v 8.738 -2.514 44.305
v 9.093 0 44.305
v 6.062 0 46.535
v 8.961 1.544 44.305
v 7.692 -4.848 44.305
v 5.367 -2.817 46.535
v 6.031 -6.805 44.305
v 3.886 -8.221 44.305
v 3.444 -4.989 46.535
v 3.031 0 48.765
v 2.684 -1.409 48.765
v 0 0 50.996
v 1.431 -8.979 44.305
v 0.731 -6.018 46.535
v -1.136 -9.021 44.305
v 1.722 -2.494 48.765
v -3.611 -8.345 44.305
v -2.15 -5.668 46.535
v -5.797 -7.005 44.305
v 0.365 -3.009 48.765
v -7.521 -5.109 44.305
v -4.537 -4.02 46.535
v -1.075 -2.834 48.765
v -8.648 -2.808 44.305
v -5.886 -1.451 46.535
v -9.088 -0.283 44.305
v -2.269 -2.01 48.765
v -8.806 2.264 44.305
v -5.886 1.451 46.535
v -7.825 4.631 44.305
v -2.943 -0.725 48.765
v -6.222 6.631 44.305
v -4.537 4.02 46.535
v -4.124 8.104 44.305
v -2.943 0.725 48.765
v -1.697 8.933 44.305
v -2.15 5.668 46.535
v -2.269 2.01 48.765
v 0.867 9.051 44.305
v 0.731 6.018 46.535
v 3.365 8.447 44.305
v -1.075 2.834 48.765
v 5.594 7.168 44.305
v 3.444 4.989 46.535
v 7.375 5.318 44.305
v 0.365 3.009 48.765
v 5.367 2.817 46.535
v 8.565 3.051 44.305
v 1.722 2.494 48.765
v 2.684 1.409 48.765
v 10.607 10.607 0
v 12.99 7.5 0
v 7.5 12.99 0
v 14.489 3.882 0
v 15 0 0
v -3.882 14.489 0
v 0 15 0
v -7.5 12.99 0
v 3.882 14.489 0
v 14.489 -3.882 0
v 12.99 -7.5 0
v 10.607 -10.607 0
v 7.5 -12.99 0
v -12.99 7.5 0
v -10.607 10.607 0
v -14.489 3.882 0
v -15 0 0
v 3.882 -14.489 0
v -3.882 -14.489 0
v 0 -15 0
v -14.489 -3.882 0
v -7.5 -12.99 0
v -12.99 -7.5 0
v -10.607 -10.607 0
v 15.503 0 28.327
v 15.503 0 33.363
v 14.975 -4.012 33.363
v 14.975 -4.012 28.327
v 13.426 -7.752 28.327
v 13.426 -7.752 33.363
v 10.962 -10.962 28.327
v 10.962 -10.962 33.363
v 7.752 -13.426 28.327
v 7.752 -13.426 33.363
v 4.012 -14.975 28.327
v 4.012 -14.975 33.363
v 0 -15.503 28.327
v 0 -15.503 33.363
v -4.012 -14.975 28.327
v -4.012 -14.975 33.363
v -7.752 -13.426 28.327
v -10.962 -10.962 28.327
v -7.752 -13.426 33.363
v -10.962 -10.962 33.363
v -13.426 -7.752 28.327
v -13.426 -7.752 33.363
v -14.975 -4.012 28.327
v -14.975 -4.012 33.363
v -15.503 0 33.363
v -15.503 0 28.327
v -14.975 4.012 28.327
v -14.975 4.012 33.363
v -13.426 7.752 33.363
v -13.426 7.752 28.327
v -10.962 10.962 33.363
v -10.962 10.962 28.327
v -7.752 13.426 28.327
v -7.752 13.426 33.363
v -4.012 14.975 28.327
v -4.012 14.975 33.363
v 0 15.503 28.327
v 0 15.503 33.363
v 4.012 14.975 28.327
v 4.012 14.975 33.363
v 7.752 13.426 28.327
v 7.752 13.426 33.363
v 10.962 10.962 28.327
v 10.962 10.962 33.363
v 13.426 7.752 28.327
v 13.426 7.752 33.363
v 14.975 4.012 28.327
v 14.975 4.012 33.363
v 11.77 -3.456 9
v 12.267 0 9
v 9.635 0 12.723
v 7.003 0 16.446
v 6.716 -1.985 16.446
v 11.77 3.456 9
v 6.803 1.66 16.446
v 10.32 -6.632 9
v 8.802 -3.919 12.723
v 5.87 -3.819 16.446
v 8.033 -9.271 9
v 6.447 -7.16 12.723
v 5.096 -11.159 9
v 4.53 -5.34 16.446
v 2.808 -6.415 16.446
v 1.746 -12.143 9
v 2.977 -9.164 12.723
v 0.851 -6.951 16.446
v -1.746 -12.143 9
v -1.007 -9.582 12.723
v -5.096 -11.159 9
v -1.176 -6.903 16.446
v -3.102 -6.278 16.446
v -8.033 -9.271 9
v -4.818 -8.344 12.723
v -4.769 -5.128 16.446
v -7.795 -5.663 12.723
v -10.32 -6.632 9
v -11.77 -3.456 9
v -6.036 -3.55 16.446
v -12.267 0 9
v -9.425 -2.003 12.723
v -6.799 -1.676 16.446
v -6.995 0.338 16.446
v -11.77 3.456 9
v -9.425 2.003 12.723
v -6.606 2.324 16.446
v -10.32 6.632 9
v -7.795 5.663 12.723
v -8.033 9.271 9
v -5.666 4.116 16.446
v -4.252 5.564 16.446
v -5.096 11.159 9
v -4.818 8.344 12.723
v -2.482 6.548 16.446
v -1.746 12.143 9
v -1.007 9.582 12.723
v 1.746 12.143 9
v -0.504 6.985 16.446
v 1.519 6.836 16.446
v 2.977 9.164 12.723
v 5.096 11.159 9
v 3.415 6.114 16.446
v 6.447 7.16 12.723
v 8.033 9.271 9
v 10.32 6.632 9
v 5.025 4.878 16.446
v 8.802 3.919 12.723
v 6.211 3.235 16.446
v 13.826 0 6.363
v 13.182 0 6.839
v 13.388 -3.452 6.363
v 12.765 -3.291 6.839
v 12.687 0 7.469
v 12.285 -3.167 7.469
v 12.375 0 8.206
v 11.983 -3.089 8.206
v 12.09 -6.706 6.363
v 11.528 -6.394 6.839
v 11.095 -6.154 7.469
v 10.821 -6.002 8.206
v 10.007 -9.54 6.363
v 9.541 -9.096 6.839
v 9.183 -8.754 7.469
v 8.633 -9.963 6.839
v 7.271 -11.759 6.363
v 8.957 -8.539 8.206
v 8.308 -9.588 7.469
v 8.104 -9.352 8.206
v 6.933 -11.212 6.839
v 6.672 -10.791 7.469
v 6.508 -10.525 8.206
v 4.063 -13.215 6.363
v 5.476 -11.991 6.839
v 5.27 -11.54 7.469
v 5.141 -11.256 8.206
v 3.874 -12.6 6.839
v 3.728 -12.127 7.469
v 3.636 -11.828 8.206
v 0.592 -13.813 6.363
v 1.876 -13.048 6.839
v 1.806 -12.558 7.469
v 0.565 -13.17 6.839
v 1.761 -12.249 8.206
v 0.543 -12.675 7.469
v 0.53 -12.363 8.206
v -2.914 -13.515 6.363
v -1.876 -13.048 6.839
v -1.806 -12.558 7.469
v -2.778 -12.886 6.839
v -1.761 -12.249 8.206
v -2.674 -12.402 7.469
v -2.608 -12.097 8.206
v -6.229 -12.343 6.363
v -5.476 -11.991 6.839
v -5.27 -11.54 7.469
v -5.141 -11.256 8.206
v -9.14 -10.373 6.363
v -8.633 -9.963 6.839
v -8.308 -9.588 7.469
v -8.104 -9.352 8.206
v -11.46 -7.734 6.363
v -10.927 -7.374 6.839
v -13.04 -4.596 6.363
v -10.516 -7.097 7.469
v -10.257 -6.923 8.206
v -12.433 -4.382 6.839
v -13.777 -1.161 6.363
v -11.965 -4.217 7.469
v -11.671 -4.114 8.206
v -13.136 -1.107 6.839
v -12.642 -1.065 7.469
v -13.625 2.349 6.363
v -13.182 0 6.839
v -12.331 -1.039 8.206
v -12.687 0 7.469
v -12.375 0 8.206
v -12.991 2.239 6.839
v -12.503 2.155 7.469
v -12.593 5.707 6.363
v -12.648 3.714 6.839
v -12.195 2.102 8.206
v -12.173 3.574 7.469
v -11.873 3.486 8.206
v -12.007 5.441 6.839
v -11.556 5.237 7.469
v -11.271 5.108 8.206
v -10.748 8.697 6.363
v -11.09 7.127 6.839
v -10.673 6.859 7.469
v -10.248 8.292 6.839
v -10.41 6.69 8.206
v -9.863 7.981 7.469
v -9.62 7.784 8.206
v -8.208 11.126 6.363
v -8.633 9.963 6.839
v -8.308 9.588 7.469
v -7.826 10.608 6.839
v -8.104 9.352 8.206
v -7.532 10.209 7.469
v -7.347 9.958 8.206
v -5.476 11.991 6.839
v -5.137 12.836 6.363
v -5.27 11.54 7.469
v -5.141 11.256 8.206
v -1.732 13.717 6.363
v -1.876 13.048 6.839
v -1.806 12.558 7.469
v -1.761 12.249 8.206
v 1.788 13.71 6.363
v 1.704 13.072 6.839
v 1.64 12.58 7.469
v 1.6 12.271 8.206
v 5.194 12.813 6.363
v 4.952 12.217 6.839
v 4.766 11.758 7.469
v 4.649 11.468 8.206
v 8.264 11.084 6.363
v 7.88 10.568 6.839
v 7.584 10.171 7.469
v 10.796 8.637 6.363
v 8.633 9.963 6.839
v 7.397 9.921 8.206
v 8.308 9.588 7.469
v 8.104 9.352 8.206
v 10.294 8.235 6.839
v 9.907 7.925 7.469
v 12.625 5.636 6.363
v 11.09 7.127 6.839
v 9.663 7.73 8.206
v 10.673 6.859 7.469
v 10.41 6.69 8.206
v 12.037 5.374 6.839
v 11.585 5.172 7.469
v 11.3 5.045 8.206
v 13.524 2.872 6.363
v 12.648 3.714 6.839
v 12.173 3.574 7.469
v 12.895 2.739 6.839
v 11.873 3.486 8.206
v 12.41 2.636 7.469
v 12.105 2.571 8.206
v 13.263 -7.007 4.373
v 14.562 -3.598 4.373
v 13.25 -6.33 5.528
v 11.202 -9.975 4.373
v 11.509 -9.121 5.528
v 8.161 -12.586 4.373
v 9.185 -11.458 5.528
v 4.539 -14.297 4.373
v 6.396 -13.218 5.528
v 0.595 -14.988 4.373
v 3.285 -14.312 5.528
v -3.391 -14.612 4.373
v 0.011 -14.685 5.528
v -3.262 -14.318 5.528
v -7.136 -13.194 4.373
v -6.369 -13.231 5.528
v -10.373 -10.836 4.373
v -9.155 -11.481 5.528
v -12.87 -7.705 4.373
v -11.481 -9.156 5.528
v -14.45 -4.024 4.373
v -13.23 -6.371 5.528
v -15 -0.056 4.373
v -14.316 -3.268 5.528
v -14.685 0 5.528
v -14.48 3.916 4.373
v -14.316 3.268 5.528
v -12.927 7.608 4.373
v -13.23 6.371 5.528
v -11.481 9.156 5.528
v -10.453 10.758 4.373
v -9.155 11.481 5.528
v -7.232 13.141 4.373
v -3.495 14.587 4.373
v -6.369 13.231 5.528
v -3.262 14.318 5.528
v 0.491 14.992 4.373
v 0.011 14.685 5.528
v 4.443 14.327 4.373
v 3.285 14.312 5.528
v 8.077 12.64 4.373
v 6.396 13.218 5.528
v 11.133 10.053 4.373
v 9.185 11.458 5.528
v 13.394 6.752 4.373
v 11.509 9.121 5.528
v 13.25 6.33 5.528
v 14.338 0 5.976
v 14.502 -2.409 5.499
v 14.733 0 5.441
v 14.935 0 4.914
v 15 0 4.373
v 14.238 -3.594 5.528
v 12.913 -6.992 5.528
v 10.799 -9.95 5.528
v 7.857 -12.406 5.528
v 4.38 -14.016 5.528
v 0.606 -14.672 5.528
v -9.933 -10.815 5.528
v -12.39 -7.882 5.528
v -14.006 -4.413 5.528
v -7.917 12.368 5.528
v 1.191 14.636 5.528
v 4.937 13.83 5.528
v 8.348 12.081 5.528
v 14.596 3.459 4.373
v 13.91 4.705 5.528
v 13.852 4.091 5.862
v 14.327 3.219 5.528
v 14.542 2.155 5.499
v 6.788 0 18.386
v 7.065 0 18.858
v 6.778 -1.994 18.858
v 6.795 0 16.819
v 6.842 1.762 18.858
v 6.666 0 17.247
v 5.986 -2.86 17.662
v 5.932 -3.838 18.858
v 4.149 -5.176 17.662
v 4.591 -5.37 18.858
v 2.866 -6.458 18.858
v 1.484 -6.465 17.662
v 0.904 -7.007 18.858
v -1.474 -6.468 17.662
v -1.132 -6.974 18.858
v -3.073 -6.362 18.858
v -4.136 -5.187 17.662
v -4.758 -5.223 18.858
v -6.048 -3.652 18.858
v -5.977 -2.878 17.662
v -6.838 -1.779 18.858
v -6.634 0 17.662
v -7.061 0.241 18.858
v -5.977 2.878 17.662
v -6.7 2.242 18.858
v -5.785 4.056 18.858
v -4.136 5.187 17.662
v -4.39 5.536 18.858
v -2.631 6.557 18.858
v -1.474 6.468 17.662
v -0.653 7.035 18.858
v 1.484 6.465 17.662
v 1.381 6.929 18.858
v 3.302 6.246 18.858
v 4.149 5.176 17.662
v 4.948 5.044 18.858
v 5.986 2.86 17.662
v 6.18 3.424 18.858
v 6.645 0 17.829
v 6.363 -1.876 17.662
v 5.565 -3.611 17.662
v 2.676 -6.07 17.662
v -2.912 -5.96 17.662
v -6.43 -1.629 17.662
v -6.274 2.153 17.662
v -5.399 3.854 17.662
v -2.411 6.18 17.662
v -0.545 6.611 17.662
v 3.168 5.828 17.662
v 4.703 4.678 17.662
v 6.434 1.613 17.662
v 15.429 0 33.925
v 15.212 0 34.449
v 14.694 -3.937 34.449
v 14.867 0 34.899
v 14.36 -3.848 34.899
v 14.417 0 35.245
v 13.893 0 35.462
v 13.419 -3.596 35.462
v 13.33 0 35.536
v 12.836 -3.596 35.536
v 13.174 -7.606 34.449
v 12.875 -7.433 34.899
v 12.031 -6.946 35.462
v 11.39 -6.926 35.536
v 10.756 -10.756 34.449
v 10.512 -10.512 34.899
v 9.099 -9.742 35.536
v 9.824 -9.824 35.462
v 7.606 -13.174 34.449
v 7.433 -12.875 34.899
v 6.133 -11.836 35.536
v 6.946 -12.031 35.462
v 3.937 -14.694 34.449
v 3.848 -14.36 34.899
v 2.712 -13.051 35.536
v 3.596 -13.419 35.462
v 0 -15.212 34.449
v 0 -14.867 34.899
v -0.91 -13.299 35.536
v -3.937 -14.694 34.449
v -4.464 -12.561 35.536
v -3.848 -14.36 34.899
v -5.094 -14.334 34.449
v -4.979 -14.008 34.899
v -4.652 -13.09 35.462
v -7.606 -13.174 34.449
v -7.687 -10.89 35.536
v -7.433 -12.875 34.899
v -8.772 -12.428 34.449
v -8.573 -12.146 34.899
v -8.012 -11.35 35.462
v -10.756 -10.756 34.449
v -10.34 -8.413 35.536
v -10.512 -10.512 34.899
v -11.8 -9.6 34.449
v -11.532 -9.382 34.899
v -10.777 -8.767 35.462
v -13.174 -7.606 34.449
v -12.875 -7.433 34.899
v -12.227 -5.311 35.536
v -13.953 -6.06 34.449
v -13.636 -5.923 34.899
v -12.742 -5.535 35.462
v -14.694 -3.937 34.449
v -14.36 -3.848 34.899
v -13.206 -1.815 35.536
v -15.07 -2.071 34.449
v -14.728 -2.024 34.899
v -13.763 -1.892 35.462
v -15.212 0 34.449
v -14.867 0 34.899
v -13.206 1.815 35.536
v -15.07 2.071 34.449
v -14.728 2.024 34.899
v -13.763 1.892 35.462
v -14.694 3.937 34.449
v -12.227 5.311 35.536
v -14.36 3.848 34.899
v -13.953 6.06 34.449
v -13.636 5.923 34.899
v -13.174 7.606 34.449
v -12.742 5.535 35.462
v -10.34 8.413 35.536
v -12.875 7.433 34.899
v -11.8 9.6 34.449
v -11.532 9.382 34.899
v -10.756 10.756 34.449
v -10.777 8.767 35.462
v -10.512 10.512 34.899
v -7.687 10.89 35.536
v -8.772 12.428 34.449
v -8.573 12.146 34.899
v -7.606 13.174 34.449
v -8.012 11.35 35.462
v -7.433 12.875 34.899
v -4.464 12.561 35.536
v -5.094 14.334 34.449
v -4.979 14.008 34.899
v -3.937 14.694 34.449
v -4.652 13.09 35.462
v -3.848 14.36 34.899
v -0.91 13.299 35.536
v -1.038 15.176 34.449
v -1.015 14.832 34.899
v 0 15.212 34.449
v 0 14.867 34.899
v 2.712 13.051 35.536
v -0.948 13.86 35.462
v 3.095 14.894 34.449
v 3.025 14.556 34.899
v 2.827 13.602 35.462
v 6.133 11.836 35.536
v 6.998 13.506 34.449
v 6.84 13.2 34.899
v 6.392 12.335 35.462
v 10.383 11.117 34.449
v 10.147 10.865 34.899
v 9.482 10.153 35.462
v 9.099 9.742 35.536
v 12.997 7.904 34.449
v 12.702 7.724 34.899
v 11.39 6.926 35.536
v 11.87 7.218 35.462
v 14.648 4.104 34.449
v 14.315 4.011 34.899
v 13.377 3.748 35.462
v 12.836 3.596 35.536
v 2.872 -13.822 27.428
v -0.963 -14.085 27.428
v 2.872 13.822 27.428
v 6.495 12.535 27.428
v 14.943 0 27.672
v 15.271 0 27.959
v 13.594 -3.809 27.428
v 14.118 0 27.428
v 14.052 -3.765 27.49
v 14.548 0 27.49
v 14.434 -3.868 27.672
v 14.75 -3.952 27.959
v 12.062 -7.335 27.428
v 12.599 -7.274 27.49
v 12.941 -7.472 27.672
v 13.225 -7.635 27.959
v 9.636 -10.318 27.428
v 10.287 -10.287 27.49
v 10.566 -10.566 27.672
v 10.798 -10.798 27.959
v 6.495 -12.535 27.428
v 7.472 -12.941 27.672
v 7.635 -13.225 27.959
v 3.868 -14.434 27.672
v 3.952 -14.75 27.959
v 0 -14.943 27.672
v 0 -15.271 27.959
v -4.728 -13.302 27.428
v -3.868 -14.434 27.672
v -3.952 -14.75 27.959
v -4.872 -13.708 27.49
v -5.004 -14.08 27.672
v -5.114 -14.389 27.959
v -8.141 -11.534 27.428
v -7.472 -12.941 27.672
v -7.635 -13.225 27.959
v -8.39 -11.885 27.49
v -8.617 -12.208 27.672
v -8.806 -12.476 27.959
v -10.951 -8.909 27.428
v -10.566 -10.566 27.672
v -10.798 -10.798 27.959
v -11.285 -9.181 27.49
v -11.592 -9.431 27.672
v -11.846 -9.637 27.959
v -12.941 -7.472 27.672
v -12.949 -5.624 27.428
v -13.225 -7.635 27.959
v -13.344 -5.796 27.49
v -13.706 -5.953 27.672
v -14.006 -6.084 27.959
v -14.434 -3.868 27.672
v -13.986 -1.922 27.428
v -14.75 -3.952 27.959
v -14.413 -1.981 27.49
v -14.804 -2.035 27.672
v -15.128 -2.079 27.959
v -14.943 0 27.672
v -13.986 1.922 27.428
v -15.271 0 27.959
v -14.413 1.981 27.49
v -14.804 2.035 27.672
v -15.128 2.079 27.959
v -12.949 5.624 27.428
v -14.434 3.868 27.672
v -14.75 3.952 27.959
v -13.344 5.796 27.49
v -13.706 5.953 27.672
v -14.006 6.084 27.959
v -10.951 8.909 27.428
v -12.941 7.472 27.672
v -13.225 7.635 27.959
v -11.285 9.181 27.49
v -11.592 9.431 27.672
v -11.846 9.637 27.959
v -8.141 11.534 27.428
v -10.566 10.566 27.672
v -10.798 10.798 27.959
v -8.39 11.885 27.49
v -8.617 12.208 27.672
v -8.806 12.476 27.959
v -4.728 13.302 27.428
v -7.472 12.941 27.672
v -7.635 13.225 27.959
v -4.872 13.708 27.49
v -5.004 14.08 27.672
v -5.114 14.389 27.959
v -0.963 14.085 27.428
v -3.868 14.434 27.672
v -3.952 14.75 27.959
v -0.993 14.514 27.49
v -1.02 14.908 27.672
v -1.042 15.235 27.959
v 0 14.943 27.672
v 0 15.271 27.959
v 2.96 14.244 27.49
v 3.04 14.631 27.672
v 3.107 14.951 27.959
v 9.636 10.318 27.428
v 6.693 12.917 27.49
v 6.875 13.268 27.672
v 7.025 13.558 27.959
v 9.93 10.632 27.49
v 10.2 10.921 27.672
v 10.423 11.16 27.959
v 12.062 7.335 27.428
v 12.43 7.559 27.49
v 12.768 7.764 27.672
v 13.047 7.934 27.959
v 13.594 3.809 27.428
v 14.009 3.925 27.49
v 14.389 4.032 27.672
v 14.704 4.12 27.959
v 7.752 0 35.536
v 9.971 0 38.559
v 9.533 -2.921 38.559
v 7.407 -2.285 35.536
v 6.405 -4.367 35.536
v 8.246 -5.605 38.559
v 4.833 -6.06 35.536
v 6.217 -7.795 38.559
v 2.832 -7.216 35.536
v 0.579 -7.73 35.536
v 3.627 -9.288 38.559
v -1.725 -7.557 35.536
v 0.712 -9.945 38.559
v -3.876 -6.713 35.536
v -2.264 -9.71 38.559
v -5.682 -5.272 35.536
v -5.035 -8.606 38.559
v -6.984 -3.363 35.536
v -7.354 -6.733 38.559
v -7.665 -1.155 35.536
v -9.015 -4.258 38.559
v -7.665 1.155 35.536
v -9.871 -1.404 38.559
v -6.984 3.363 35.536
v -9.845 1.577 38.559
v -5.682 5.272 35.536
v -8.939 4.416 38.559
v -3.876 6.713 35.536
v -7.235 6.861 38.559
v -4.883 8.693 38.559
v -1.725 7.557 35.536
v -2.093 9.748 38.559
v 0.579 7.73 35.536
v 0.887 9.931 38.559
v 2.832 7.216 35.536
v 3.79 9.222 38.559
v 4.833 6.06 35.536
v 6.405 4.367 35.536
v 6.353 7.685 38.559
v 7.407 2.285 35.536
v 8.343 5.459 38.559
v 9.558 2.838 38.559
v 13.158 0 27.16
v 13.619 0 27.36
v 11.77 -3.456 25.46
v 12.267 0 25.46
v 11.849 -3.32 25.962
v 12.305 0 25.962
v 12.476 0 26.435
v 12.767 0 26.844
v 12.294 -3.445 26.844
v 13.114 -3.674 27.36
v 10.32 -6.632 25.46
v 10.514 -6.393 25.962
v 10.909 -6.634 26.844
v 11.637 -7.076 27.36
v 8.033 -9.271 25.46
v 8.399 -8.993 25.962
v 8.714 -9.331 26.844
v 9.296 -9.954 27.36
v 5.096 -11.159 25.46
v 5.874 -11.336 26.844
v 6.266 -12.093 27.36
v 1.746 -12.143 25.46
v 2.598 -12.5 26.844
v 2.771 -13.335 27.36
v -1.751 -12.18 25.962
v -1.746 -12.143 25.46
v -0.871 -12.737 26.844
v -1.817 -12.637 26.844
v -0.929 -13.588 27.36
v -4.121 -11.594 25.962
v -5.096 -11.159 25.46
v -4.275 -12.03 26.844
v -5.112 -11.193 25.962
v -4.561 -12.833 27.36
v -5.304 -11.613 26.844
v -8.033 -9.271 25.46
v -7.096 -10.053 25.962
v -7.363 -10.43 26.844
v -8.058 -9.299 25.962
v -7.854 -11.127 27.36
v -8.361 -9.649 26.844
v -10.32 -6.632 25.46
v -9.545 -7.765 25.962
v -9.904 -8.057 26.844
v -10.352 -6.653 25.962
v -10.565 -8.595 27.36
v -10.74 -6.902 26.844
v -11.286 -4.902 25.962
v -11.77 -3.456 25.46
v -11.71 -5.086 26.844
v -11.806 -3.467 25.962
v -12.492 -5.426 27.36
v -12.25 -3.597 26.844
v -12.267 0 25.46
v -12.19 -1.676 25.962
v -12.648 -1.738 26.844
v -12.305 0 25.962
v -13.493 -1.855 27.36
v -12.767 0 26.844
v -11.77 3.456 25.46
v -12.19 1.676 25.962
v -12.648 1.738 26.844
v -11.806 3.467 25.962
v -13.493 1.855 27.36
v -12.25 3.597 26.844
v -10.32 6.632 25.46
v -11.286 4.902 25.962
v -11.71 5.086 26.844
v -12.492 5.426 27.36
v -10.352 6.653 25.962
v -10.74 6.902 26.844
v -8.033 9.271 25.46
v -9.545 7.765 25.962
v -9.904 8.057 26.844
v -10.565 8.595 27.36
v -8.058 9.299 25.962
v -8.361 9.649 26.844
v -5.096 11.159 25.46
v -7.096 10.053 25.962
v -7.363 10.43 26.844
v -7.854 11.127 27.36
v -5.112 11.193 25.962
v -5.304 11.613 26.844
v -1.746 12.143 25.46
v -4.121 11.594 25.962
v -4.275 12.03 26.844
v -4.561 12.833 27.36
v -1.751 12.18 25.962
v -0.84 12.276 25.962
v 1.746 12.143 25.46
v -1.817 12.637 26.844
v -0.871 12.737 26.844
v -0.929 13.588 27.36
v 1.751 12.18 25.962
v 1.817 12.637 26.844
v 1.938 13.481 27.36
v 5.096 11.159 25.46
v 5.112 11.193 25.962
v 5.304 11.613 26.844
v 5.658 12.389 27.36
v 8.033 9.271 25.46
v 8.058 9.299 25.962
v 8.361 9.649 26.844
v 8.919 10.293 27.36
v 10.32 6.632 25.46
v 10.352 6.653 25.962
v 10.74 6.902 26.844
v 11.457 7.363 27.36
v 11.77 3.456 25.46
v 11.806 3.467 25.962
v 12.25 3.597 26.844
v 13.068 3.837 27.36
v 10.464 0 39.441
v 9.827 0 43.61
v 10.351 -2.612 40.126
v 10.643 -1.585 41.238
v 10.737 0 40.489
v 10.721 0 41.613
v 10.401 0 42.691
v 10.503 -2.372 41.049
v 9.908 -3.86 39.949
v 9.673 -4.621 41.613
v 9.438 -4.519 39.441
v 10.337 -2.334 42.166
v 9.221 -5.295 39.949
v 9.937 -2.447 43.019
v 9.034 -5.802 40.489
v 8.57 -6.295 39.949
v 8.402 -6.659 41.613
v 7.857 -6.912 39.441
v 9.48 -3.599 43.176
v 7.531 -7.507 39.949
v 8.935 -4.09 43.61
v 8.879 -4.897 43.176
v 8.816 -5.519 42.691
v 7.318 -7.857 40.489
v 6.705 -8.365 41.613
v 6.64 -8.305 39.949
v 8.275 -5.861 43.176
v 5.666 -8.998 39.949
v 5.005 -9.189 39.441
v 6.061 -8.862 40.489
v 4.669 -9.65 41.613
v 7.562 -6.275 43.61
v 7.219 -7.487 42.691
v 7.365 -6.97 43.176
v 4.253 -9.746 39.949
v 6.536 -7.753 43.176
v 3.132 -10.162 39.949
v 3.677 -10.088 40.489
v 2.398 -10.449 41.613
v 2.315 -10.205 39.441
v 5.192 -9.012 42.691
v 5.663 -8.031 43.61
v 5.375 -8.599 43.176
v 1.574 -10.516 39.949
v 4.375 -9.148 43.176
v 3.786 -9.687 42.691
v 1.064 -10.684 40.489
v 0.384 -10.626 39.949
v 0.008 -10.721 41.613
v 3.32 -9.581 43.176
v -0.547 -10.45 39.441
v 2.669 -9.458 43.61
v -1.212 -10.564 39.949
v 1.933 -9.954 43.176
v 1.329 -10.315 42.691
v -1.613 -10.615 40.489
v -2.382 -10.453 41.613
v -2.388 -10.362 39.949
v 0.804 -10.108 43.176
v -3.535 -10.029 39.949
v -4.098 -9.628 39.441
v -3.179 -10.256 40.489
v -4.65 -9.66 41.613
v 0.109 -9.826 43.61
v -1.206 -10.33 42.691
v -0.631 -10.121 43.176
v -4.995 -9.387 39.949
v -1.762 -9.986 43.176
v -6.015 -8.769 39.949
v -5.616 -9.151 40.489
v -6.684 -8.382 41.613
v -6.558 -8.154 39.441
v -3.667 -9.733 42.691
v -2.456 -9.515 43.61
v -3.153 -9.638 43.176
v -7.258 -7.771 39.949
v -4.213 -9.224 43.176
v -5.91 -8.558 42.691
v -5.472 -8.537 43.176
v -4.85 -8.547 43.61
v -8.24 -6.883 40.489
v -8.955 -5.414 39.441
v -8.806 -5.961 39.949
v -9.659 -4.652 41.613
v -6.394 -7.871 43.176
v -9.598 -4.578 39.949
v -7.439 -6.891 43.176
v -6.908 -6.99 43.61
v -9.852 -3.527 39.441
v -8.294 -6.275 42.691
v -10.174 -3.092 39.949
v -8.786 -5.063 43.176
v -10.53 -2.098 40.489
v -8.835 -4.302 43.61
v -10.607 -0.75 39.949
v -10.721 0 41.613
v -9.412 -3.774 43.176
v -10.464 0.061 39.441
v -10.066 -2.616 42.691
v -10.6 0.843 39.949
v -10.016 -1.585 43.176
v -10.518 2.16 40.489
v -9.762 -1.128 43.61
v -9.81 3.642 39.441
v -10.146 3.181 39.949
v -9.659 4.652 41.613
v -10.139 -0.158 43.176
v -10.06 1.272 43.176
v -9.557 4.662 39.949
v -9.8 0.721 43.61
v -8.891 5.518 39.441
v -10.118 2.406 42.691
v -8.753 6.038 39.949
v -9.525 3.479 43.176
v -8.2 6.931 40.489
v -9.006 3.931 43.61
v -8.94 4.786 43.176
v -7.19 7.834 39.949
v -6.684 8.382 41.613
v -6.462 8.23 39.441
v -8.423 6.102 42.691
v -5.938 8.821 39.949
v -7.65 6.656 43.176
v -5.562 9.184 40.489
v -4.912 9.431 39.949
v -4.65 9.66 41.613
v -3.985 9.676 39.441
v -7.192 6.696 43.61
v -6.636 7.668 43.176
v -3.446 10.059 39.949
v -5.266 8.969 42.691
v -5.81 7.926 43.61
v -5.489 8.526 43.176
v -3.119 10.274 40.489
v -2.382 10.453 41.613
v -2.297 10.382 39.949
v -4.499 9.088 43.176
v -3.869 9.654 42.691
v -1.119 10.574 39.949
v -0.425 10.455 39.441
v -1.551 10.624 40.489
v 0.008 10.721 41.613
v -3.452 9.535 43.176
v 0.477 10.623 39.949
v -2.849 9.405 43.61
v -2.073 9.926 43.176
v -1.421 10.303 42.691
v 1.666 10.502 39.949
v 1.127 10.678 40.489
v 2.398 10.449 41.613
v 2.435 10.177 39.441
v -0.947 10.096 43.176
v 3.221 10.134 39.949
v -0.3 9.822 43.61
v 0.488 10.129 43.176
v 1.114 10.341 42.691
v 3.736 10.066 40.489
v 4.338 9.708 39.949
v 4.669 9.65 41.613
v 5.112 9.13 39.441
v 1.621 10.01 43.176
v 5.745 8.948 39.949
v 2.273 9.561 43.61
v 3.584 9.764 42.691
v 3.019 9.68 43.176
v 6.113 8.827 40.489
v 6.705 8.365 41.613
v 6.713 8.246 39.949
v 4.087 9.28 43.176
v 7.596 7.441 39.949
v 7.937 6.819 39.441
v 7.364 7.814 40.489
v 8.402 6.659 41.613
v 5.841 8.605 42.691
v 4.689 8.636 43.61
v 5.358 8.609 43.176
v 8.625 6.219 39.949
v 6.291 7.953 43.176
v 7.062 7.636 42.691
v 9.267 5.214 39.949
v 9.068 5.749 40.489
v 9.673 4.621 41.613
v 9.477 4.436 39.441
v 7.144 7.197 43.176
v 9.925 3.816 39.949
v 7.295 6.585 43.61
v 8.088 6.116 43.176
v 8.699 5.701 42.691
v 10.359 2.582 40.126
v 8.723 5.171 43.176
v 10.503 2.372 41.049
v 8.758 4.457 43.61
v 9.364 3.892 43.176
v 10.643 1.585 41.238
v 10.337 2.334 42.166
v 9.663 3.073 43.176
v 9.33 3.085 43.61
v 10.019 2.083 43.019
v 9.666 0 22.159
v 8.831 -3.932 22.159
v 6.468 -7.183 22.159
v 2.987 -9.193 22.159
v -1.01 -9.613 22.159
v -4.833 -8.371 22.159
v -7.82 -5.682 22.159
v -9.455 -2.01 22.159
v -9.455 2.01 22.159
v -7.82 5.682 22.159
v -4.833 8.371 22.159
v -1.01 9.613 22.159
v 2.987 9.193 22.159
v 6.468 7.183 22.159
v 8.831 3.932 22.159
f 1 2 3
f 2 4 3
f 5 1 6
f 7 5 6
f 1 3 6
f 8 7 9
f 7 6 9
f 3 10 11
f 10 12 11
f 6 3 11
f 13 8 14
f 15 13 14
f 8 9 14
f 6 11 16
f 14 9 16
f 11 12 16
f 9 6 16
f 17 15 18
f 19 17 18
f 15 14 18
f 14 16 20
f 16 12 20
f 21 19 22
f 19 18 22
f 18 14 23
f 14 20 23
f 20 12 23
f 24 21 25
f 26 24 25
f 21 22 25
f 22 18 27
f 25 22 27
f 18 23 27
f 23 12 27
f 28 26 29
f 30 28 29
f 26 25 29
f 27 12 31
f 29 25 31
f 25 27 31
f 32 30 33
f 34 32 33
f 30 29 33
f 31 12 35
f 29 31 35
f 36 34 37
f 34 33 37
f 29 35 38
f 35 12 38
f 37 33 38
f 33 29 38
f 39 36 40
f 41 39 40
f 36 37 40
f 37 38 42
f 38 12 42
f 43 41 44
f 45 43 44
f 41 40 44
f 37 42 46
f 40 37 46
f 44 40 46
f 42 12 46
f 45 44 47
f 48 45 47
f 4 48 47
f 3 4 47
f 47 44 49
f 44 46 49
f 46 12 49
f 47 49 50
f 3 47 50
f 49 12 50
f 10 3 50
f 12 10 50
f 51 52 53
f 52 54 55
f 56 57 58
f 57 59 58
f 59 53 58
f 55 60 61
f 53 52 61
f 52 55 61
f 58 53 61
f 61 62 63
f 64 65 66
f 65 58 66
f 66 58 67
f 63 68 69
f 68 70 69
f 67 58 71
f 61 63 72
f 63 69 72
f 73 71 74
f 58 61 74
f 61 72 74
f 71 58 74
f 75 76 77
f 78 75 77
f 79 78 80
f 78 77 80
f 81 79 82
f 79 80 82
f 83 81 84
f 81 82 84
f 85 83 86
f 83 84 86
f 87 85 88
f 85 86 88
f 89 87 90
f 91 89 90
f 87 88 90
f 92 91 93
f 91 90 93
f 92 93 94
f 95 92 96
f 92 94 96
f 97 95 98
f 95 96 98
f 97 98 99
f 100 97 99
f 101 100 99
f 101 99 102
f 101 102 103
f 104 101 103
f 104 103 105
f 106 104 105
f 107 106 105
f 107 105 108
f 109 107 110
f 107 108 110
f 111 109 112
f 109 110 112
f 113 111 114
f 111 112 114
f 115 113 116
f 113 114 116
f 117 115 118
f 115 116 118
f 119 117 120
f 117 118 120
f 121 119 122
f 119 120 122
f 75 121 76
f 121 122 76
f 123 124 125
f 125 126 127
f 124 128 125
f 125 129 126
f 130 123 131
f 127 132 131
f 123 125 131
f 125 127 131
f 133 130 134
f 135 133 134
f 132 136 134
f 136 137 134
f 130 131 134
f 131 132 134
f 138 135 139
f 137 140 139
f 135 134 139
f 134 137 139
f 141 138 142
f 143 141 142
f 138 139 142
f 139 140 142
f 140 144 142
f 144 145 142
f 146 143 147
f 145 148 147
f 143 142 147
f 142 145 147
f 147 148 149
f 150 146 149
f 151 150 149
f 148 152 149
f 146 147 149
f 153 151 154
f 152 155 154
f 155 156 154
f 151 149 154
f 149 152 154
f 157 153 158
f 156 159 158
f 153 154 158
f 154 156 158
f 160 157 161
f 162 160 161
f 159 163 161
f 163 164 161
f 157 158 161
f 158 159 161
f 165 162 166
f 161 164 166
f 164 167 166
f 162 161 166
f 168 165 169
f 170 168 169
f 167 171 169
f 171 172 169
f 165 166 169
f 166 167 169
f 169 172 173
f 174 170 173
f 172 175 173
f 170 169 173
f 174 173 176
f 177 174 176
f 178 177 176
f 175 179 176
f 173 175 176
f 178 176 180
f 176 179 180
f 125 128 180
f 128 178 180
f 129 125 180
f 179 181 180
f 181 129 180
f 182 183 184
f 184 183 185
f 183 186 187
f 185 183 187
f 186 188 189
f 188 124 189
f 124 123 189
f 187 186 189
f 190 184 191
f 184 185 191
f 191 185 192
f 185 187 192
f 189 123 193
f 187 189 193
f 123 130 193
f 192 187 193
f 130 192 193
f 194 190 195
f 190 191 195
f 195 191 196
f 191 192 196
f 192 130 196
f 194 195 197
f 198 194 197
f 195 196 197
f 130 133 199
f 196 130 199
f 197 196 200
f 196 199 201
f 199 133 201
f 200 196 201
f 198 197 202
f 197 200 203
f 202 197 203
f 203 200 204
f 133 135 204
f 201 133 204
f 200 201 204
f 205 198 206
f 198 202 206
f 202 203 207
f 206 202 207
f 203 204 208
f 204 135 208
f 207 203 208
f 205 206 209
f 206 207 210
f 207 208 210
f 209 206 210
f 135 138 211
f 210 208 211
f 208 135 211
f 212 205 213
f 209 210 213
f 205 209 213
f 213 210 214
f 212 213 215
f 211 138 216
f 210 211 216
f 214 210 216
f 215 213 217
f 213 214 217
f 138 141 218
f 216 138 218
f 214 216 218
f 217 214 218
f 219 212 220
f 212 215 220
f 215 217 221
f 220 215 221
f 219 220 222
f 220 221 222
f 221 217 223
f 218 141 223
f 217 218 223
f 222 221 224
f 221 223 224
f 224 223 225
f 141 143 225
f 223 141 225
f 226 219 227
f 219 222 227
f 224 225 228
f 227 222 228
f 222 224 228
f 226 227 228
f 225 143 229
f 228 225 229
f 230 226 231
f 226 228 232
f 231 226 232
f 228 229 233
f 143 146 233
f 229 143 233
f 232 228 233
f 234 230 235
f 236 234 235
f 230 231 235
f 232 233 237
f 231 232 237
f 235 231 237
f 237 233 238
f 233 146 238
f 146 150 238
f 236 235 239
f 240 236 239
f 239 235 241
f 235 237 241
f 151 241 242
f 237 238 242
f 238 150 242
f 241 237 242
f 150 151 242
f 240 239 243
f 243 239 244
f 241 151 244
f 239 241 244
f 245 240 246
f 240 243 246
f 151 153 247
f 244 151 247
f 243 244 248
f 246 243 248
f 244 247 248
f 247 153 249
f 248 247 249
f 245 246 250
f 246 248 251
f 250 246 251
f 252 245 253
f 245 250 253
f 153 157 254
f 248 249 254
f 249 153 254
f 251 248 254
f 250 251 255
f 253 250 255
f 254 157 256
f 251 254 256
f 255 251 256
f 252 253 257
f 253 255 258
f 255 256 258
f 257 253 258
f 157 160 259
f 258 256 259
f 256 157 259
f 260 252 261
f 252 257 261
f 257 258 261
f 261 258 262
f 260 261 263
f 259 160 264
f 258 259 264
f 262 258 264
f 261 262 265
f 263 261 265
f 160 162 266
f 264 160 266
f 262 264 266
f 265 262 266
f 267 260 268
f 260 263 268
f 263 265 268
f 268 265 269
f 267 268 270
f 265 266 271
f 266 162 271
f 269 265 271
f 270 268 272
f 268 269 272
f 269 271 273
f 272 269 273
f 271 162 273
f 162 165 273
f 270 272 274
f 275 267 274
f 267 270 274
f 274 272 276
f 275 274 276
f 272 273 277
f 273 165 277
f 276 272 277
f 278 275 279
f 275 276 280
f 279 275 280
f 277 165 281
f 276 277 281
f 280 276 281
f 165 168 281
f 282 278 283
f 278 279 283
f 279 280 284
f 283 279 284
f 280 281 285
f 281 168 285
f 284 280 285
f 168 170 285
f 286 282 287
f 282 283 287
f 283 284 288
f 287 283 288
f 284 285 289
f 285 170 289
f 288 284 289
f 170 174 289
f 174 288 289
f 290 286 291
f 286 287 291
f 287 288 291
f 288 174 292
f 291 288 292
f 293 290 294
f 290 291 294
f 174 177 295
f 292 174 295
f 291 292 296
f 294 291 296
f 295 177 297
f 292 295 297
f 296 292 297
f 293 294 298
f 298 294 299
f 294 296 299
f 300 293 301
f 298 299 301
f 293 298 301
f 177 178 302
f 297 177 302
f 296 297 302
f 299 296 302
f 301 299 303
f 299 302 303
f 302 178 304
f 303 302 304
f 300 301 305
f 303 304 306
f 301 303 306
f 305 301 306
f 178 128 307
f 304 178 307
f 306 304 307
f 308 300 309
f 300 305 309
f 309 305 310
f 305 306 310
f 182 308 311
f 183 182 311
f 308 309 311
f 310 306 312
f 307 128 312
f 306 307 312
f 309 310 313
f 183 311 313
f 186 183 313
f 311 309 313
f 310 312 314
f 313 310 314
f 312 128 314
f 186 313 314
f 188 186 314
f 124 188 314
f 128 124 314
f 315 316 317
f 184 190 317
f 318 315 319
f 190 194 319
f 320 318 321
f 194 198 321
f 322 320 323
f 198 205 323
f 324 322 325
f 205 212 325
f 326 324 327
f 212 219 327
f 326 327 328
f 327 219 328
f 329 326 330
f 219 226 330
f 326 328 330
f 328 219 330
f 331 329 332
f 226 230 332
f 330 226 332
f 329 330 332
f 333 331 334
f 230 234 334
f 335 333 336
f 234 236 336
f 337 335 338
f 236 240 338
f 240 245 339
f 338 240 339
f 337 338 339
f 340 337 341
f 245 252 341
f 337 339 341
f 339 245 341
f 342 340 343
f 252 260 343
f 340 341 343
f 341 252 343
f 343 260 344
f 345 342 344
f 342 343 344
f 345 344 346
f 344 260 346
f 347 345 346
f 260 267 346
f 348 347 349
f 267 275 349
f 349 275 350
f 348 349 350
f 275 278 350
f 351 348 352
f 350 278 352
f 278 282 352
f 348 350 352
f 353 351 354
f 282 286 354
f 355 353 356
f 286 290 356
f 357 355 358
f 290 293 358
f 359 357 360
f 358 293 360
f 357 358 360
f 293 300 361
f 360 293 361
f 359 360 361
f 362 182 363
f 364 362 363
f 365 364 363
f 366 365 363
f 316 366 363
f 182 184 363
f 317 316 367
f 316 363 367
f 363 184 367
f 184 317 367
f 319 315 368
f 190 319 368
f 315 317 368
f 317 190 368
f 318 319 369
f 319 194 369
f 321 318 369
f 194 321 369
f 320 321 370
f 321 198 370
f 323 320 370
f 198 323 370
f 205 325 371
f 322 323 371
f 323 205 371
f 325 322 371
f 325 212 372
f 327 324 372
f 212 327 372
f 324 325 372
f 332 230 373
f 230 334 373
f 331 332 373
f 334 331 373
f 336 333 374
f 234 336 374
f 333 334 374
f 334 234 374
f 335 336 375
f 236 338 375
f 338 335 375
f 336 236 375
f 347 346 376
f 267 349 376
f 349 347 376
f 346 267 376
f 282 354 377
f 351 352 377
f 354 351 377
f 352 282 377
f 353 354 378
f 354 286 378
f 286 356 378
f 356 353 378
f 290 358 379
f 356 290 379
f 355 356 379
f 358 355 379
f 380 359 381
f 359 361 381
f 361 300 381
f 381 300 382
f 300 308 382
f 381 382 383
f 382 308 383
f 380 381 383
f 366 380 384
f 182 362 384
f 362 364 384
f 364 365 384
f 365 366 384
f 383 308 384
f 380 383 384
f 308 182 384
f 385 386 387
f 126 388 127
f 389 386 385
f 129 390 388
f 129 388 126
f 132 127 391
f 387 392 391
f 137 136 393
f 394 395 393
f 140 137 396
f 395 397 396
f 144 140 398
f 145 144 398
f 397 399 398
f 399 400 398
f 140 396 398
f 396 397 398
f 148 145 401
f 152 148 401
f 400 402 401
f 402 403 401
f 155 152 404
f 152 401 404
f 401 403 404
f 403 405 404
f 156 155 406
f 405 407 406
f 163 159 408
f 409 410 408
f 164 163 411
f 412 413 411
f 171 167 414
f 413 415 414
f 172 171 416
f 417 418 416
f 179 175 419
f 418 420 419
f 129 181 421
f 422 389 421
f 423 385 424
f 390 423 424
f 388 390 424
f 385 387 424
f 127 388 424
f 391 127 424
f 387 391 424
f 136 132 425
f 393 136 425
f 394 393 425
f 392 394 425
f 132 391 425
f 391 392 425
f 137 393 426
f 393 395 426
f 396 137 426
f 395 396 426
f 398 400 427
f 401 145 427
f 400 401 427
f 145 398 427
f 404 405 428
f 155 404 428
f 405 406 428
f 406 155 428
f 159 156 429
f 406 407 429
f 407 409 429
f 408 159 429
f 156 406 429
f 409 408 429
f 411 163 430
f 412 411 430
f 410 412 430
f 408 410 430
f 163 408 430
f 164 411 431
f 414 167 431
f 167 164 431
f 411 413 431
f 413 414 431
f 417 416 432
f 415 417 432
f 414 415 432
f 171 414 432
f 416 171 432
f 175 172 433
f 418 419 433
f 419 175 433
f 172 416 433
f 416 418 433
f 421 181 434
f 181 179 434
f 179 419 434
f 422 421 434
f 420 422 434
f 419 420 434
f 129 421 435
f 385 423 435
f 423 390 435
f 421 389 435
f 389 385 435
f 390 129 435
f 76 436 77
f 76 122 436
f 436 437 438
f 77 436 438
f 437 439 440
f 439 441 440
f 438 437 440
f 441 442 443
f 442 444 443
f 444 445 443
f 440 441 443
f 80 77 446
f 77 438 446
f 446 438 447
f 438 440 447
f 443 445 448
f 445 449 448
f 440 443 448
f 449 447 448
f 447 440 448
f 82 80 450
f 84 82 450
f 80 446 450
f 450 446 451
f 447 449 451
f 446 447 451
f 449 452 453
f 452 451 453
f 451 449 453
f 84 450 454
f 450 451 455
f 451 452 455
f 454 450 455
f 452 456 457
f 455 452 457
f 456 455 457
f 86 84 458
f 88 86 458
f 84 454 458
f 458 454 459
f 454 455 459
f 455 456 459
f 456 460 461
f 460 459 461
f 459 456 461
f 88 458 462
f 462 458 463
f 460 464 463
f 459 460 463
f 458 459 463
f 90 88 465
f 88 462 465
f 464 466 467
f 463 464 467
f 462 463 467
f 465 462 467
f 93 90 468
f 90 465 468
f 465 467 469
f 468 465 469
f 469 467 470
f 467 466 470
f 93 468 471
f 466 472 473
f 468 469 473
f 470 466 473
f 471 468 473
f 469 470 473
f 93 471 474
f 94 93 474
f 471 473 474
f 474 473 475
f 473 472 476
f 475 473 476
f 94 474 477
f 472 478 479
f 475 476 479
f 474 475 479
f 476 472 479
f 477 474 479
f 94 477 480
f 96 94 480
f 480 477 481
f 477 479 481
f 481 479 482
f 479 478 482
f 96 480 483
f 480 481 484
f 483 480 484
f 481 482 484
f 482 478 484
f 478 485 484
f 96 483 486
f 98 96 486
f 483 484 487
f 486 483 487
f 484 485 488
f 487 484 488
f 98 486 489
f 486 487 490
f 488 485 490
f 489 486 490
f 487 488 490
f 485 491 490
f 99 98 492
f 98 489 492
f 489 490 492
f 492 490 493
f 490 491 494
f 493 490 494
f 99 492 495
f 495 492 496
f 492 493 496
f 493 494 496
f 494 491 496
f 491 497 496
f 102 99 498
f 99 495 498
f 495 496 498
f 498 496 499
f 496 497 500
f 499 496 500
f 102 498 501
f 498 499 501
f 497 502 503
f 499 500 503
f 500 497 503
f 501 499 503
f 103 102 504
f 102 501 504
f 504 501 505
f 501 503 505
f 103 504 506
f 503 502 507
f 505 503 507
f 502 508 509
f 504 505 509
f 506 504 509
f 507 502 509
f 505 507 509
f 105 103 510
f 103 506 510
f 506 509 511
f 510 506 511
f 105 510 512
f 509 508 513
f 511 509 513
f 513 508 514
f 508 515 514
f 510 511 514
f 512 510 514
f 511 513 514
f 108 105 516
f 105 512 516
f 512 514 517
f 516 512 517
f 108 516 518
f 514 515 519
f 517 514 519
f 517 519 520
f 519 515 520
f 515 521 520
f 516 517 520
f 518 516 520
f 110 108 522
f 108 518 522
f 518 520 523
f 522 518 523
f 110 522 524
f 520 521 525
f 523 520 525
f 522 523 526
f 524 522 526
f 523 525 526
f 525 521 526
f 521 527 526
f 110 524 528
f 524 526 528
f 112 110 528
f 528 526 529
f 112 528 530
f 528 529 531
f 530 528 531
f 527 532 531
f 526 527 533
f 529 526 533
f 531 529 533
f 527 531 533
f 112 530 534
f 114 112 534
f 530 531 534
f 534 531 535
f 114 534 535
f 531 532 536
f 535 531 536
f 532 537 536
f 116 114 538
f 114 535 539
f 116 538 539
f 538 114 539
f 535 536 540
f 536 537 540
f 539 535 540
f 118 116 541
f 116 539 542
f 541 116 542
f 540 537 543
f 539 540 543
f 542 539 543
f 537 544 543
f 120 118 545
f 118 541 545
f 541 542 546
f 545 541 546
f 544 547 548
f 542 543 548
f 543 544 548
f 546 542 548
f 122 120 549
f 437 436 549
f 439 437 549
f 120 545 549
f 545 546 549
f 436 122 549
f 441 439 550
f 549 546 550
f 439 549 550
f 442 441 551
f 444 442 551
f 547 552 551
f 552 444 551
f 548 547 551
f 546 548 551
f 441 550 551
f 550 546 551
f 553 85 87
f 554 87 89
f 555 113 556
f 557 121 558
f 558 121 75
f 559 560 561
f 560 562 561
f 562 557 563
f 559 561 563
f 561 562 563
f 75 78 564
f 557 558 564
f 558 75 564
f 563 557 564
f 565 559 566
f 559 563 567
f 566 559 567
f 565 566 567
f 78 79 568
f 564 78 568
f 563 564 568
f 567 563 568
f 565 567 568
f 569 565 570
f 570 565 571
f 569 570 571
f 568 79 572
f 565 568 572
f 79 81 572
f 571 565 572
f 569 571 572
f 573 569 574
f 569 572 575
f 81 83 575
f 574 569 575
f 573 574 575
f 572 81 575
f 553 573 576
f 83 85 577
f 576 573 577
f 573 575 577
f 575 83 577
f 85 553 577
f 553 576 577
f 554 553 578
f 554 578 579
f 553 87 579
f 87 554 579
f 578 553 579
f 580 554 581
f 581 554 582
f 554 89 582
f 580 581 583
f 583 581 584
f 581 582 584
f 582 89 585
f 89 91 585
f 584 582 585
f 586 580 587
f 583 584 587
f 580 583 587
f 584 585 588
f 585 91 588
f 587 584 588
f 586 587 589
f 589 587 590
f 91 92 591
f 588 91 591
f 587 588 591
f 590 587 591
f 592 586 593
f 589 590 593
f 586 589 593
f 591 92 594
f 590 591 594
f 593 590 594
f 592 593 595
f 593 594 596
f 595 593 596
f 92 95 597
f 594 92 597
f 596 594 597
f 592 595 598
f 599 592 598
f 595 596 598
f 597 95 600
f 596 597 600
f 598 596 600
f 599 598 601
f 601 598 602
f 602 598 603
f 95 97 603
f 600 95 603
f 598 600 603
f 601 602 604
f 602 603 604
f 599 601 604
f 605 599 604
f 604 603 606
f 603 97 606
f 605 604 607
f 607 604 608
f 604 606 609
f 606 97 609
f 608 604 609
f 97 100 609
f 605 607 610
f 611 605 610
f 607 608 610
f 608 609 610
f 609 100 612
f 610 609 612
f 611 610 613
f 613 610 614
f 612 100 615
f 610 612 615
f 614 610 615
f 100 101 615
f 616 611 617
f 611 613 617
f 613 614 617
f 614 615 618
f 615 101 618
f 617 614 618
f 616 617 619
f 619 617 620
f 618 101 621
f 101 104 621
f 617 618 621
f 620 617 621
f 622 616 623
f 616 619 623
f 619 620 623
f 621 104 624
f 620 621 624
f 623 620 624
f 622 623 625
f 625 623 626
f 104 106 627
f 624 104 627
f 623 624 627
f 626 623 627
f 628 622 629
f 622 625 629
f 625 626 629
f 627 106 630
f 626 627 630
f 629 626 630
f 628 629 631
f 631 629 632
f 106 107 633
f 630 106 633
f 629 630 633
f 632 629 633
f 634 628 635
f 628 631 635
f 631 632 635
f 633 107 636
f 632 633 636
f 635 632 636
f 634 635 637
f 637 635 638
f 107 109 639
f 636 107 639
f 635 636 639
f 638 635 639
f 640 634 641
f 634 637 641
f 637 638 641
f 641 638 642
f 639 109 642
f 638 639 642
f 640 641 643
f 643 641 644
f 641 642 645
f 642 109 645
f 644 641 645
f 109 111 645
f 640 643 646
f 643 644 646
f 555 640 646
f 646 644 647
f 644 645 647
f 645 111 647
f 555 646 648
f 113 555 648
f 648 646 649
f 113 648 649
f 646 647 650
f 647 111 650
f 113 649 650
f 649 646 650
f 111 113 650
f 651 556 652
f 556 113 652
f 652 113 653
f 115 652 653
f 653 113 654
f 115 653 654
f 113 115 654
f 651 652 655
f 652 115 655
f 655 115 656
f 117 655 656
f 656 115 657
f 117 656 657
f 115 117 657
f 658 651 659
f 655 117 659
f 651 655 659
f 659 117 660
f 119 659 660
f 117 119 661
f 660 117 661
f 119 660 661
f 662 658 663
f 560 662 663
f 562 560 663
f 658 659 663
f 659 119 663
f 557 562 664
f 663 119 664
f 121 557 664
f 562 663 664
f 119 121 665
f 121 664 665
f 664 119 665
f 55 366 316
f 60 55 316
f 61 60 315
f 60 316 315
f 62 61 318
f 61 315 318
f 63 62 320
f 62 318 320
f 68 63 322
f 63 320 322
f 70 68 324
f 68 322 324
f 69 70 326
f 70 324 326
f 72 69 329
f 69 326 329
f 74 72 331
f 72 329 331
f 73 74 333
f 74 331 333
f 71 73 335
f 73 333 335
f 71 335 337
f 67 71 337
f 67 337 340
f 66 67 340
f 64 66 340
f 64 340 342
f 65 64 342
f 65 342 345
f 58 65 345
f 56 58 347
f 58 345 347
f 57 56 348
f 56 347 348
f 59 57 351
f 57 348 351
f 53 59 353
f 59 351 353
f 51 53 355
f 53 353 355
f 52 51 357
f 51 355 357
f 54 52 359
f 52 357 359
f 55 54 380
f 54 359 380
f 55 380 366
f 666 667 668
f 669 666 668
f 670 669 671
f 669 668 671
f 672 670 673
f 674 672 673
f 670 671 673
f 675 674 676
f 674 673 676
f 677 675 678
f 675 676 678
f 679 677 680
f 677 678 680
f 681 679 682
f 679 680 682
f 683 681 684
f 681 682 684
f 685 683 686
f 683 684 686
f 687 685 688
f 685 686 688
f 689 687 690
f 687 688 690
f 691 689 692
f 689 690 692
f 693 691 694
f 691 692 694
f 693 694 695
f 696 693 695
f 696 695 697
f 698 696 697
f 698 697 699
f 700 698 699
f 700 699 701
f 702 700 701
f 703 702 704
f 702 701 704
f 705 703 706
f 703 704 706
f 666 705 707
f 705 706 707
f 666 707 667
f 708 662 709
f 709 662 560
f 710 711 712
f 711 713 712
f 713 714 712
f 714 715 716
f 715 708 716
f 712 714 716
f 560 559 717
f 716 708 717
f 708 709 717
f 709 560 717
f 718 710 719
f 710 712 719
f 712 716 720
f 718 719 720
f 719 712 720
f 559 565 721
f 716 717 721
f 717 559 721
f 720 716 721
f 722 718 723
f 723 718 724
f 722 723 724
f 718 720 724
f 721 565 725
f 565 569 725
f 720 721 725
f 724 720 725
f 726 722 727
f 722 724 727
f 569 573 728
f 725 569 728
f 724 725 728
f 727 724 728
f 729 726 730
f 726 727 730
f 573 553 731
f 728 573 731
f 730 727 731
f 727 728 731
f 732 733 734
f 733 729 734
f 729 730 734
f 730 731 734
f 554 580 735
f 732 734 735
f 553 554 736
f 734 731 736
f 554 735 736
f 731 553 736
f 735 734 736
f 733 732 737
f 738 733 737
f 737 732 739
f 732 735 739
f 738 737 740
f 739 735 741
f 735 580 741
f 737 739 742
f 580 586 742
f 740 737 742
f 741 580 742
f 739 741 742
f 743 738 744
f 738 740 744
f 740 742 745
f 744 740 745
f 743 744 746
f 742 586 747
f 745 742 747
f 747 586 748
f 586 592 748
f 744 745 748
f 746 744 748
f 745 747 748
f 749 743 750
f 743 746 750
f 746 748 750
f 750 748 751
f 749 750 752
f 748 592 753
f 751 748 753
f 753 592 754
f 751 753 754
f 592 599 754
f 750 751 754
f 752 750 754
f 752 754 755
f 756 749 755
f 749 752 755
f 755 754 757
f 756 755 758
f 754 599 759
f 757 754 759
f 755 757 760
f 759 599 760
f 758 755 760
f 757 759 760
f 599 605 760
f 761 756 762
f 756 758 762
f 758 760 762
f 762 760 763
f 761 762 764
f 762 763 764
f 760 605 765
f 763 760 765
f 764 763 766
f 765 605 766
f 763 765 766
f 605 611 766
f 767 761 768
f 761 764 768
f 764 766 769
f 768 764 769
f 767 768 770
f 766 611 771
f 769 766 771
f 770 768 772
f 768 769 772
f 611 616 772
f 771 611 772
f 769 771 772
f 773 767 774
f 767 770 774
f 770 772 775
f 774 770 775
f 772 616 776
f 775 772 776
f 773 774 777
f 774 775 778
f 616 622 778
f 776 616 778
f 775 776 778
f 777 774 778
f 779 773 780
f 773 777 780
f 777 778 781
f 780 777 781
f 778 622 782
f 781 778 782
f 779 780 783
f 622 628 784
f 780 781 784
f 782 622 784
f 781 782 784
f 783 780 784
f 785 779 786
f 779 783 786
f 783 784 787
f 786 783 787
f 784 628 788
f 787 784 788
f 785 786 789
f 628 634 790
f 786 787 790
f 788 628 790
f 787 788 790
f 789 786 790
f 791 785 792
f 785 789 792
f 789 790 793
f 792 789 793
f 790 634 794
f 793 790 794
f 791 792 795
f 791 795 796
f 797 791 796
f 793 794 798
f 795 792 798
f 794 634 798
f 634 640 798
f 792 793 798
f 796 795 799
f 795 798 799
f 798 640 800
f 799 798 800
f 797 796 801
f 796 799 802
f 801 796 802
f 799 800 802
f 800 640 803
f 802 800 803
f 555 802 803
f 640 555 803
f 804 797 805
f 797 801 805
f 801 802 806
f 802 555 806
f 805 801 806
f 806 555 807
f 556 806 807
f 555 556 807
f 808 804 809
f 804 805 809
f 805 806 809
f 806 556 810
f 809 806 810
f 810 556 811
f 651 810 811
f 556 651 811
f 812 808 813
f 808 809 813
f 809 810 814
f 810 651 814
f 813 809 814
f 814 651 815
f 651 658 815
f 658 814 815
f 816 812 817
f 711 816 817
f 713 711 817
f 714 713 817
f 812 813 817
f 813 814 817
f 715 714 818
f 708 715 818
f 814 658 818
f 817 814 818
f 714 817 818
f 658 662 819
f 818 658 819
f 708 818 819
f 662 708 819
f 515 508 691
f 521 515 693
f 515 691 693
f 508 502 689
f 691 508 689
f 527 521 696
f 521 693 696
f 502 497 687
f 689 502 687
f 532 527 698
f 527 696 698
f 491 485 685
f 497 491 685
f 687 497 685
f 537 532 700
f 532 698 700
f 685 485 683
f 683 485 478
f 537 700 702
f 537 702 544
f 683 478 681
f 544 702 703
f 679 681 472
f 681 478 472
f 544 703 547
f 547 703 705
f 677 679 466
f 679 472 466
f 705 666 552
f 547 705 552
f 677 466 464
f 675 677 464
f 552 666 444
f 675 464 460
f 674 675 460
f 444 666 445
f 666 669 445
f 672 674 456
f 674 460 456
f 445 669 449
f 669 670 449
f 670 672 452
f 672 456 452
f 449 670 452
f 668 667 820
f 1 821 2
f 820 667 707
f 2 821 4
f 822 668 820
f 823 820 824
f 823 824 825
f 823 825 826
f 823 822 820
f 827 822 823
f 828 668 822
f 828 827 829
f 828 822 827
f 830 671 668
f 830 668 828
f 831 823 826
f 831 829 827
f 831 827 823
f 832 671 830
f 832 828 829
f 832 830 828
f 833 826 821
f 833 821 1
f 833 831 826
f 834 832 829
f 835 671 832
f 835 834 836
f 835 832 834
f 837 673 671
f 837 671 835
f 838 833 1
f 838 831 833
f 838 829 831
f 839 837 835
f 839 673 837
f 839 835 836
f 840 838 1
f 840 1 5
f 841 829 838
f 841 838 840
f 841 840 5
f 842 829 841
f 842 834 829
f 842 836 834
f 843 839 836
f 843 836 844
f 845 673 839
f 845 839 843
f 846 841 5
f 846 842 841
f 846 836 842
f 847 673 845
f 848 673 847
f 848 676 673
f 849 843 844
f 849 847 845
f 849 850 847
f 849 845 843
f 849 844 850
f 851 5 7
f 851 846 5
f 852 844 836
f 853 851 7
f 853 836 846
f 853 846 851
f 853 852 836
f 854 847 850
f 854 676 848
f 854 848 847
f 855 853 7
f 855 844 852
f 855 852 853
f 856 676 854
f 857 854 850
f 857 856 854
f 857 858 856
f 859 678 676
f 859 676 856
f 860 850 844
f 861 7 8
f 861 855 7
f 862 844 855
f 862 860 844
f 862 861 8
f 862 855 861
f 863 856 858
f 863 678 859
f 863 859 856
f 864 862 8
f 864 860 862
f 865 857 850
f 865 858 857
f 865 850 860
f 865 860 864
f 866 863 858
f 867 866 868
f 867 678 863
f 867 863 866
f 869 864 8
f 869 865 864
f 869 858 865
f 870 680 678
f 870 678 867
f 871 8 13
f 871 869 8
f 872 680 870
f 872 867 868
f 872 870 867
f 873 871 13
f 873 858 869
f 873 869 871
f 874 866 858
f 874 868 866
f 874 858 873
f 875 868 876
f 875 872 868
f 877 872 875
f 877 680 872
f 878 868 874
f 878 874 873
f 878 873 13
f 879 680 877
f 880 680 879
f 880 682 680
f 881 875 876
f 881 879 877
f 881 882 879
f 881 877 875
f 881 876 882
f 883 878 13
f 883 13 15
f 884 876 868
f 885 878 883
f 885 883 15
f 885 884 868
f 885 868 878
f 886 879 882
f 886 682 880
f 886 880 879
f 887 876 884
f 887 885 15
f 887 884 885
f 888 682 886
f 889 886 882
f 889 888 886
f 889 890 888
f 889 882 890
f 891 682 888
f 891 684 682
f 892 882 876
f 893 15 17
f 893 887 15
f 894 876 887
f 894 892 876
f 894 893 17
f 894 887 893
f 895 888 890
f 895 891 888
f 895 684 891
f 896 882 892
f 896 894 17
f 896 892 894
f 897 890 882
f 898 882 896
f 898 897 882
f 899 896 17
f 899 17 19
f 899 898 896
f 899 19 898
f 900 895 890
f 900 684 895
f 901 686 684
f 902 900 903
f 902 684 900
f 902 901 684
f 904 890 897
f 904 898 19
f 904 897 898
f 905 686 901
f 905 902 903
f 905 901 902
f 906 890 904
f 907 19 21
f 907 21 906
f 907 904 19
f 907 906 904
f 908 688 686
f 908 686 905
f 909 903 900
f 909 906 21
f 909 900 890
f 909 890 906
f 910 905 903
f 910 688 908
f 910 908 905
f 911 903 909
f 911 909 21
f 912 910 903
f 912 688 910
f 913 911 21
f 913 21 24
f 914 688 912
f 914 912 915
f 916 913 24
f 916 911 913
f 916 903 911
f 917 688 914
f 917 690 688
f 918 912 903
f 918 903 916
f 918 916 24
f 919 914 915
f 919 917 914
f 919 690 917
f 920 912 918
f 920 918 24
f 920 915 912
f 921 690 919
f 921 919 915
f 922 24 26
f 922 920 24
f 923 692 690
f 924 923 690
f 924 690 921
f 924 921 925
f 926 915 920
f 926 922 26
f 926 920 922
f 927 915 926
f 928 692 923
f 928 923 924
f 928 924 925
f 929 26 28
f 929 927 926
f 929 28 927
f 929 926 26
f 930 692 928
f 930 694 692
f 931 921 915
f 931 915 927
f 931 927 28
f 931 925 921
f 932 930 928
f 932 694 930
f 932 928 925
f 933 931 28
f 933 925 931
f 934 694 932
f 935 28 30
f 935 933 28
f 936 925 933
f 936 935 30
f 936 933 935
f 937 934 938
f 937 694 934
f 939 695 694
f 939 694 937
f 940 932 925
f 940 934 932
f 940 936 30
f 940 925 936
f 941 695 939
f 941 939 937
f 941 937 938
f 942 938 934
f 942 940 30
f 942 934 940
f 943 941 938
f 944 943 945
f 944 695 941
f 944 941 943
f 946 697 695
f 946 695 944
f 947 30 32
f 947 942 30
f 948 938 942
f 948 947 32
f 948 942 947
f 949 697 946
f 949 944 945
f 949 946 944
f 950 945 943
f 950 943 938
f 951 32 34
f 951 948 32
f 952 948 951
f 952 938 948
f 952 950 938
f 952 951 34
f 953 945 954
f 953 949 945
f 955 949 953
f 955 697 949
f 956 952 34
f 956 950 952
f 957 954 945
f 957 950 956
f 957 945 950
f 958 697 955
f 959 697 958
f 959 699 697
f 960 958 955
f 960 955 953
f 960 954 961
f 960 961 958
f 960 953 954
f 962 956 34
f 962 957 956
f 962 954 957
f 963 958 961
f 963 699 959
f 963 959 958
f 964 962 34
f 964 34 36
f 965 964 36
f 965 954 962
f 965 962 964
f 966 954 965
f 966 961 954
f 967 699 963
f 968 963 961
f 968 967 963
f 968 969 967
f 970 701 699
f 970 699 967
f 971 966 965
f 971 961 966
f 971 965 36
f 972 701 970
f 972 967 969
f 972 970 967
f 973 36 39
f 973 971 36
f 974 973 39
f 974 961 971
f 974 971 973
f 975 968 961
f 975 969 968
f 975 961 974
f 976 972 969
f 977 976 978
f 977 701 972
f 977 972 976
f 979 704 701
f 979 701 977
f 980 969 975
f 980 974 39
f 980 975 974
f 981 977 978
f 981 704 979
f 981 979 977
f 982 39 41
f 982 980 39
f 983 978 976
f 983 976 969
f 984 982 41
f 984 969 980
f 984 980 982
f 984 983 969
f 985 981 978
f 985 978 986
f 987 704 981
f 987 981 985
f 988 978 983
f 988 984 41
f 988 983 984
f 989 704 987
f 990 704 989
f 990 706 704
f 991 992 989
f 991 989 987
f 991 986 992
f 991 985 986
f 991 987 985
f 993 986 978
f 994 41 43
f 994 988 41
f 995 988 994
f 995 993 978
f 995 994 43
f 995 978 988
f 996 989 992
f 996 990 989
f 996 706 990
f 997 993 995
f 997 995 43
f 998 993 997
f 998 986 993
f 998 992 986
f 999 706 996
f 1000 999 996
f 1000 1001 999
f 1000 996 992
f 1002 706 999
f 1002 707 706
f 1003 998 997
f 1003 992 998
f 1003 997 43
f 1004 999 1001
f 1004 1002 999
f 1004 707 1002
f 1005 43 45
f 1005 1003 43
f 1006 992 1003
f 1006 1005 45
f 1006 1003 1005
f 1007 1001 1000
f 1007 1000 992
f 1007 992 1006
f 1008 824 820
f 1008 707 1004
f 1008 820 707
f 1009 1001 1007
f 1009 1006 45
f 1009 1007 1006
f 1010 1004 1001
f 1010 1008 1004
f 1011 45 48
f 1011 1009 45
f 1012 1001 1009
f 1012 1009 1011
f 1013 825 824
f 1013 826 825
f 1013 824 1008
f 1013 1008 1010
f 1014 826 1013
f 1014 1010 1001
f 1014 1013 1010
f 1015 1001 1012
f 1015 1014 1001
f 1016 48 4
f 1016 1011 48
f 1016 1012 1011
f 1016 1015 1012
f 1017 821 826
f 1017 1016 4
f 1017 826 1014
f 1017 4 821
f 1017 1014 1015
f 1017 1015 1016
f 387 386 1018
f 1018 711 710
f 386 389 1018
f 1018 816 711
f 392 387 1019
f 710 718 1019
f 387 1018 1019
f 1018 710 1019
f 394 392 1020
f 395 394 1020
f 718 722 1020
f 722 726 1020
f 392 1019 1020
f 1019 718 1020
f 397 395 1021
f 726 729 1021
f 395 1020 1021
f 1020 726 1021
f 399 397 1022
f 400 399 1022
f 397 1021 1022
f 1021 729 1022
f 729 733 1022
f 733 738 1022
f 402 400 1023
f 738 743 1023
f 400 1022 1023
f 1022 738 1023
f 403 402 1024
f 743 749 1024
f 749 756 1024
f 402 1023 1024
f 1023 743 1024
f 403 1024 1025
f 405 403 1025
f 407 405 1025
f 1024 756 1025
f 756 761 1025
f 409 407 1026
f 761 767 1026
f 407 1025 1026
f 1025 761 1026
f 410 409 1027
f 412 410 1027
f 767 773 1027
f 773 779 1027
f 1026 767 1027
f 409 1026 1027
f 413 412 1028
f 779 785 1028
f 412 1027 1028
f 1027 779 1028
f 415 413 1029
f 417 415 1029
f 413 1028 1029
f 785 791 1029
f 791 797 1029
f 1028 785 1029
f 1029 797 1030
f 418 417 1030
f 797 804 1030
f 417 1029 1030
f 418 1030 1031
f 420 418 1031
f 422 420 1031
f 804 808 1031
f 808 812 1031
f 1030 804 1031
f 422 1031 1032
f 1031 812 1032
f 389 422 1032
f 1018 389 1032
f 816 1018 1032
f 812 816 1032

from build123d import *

# Parameters (mm, degrees)
F2_R = 2.172792
F3_R = 2.016112
F4_R = 2.27312
F5_R = 4.112477


with BuildPart() as f1:
    # F0 (on Front) → F1 (revolve)
    with BuildSketch(Plane.XZ):
        with BuildLine():
            Line((0, 50.995532), (0, 0))
            Line((0, 0), (15, 0))
            Line((15, 0), (15, 6))
            ThreePointArc((15, 6), (13.053955, 6.97193), (12.267397, 9))
            Line((12.267397, 9), (6.133698, 17.675072))
            Line((6.133698, 17.675072), (12.267397, 25.46047))
            ThreePointArc((12.267397, 25.46047), (12.767184, 26.84415), (14.117566, 27.427955))
            ThreePointArc((14.117566, 27.427955), (14.943247, 27.672265), (15.503053, 28.326524))
            Line((15.503053, 28.326524), (15.503053, 35.535693))
            Line((15.503053, 35.535693), (7.751526, 35.535693))
            Line((7.751526, 35.535693), (12.401166, 41.87016))
            Line((12.401166, 41.87016), (0, 50.995532))
        make_face()
    revolve(axis=Axis((0, 0, 25.497766), (0, 0, -1)))

    # F2
    f2_edges = [f1.edges().sort_by_distance(p)[0] for p in [
        (-15.503053, 0, 35.535693),
    ]]
    fillet(f2_edges, radius=F2_R)

    # F3
    f3_edges = [f1.edges().sort_by_distance(p)[0] for p in [
        (-6.133698, 0, 17.675072),
    ]]
    fillet(f3_edges, radius=F3_R)

    # F4
    f4_edges = [f1.edges().sort_by_distance(p)[0] for p in [
        (-15, 0, 6),
    ]]
    fillet(f4_edges, radius=F4_R)

    # F5
    f5_edges = [f1.edges().sort_by_distance(p)[0] for p in [
        (-12.401166, 0, 41.87016),
    ]]
    fillet(f5_edges, radius=F5_R)


solid = f1.part
